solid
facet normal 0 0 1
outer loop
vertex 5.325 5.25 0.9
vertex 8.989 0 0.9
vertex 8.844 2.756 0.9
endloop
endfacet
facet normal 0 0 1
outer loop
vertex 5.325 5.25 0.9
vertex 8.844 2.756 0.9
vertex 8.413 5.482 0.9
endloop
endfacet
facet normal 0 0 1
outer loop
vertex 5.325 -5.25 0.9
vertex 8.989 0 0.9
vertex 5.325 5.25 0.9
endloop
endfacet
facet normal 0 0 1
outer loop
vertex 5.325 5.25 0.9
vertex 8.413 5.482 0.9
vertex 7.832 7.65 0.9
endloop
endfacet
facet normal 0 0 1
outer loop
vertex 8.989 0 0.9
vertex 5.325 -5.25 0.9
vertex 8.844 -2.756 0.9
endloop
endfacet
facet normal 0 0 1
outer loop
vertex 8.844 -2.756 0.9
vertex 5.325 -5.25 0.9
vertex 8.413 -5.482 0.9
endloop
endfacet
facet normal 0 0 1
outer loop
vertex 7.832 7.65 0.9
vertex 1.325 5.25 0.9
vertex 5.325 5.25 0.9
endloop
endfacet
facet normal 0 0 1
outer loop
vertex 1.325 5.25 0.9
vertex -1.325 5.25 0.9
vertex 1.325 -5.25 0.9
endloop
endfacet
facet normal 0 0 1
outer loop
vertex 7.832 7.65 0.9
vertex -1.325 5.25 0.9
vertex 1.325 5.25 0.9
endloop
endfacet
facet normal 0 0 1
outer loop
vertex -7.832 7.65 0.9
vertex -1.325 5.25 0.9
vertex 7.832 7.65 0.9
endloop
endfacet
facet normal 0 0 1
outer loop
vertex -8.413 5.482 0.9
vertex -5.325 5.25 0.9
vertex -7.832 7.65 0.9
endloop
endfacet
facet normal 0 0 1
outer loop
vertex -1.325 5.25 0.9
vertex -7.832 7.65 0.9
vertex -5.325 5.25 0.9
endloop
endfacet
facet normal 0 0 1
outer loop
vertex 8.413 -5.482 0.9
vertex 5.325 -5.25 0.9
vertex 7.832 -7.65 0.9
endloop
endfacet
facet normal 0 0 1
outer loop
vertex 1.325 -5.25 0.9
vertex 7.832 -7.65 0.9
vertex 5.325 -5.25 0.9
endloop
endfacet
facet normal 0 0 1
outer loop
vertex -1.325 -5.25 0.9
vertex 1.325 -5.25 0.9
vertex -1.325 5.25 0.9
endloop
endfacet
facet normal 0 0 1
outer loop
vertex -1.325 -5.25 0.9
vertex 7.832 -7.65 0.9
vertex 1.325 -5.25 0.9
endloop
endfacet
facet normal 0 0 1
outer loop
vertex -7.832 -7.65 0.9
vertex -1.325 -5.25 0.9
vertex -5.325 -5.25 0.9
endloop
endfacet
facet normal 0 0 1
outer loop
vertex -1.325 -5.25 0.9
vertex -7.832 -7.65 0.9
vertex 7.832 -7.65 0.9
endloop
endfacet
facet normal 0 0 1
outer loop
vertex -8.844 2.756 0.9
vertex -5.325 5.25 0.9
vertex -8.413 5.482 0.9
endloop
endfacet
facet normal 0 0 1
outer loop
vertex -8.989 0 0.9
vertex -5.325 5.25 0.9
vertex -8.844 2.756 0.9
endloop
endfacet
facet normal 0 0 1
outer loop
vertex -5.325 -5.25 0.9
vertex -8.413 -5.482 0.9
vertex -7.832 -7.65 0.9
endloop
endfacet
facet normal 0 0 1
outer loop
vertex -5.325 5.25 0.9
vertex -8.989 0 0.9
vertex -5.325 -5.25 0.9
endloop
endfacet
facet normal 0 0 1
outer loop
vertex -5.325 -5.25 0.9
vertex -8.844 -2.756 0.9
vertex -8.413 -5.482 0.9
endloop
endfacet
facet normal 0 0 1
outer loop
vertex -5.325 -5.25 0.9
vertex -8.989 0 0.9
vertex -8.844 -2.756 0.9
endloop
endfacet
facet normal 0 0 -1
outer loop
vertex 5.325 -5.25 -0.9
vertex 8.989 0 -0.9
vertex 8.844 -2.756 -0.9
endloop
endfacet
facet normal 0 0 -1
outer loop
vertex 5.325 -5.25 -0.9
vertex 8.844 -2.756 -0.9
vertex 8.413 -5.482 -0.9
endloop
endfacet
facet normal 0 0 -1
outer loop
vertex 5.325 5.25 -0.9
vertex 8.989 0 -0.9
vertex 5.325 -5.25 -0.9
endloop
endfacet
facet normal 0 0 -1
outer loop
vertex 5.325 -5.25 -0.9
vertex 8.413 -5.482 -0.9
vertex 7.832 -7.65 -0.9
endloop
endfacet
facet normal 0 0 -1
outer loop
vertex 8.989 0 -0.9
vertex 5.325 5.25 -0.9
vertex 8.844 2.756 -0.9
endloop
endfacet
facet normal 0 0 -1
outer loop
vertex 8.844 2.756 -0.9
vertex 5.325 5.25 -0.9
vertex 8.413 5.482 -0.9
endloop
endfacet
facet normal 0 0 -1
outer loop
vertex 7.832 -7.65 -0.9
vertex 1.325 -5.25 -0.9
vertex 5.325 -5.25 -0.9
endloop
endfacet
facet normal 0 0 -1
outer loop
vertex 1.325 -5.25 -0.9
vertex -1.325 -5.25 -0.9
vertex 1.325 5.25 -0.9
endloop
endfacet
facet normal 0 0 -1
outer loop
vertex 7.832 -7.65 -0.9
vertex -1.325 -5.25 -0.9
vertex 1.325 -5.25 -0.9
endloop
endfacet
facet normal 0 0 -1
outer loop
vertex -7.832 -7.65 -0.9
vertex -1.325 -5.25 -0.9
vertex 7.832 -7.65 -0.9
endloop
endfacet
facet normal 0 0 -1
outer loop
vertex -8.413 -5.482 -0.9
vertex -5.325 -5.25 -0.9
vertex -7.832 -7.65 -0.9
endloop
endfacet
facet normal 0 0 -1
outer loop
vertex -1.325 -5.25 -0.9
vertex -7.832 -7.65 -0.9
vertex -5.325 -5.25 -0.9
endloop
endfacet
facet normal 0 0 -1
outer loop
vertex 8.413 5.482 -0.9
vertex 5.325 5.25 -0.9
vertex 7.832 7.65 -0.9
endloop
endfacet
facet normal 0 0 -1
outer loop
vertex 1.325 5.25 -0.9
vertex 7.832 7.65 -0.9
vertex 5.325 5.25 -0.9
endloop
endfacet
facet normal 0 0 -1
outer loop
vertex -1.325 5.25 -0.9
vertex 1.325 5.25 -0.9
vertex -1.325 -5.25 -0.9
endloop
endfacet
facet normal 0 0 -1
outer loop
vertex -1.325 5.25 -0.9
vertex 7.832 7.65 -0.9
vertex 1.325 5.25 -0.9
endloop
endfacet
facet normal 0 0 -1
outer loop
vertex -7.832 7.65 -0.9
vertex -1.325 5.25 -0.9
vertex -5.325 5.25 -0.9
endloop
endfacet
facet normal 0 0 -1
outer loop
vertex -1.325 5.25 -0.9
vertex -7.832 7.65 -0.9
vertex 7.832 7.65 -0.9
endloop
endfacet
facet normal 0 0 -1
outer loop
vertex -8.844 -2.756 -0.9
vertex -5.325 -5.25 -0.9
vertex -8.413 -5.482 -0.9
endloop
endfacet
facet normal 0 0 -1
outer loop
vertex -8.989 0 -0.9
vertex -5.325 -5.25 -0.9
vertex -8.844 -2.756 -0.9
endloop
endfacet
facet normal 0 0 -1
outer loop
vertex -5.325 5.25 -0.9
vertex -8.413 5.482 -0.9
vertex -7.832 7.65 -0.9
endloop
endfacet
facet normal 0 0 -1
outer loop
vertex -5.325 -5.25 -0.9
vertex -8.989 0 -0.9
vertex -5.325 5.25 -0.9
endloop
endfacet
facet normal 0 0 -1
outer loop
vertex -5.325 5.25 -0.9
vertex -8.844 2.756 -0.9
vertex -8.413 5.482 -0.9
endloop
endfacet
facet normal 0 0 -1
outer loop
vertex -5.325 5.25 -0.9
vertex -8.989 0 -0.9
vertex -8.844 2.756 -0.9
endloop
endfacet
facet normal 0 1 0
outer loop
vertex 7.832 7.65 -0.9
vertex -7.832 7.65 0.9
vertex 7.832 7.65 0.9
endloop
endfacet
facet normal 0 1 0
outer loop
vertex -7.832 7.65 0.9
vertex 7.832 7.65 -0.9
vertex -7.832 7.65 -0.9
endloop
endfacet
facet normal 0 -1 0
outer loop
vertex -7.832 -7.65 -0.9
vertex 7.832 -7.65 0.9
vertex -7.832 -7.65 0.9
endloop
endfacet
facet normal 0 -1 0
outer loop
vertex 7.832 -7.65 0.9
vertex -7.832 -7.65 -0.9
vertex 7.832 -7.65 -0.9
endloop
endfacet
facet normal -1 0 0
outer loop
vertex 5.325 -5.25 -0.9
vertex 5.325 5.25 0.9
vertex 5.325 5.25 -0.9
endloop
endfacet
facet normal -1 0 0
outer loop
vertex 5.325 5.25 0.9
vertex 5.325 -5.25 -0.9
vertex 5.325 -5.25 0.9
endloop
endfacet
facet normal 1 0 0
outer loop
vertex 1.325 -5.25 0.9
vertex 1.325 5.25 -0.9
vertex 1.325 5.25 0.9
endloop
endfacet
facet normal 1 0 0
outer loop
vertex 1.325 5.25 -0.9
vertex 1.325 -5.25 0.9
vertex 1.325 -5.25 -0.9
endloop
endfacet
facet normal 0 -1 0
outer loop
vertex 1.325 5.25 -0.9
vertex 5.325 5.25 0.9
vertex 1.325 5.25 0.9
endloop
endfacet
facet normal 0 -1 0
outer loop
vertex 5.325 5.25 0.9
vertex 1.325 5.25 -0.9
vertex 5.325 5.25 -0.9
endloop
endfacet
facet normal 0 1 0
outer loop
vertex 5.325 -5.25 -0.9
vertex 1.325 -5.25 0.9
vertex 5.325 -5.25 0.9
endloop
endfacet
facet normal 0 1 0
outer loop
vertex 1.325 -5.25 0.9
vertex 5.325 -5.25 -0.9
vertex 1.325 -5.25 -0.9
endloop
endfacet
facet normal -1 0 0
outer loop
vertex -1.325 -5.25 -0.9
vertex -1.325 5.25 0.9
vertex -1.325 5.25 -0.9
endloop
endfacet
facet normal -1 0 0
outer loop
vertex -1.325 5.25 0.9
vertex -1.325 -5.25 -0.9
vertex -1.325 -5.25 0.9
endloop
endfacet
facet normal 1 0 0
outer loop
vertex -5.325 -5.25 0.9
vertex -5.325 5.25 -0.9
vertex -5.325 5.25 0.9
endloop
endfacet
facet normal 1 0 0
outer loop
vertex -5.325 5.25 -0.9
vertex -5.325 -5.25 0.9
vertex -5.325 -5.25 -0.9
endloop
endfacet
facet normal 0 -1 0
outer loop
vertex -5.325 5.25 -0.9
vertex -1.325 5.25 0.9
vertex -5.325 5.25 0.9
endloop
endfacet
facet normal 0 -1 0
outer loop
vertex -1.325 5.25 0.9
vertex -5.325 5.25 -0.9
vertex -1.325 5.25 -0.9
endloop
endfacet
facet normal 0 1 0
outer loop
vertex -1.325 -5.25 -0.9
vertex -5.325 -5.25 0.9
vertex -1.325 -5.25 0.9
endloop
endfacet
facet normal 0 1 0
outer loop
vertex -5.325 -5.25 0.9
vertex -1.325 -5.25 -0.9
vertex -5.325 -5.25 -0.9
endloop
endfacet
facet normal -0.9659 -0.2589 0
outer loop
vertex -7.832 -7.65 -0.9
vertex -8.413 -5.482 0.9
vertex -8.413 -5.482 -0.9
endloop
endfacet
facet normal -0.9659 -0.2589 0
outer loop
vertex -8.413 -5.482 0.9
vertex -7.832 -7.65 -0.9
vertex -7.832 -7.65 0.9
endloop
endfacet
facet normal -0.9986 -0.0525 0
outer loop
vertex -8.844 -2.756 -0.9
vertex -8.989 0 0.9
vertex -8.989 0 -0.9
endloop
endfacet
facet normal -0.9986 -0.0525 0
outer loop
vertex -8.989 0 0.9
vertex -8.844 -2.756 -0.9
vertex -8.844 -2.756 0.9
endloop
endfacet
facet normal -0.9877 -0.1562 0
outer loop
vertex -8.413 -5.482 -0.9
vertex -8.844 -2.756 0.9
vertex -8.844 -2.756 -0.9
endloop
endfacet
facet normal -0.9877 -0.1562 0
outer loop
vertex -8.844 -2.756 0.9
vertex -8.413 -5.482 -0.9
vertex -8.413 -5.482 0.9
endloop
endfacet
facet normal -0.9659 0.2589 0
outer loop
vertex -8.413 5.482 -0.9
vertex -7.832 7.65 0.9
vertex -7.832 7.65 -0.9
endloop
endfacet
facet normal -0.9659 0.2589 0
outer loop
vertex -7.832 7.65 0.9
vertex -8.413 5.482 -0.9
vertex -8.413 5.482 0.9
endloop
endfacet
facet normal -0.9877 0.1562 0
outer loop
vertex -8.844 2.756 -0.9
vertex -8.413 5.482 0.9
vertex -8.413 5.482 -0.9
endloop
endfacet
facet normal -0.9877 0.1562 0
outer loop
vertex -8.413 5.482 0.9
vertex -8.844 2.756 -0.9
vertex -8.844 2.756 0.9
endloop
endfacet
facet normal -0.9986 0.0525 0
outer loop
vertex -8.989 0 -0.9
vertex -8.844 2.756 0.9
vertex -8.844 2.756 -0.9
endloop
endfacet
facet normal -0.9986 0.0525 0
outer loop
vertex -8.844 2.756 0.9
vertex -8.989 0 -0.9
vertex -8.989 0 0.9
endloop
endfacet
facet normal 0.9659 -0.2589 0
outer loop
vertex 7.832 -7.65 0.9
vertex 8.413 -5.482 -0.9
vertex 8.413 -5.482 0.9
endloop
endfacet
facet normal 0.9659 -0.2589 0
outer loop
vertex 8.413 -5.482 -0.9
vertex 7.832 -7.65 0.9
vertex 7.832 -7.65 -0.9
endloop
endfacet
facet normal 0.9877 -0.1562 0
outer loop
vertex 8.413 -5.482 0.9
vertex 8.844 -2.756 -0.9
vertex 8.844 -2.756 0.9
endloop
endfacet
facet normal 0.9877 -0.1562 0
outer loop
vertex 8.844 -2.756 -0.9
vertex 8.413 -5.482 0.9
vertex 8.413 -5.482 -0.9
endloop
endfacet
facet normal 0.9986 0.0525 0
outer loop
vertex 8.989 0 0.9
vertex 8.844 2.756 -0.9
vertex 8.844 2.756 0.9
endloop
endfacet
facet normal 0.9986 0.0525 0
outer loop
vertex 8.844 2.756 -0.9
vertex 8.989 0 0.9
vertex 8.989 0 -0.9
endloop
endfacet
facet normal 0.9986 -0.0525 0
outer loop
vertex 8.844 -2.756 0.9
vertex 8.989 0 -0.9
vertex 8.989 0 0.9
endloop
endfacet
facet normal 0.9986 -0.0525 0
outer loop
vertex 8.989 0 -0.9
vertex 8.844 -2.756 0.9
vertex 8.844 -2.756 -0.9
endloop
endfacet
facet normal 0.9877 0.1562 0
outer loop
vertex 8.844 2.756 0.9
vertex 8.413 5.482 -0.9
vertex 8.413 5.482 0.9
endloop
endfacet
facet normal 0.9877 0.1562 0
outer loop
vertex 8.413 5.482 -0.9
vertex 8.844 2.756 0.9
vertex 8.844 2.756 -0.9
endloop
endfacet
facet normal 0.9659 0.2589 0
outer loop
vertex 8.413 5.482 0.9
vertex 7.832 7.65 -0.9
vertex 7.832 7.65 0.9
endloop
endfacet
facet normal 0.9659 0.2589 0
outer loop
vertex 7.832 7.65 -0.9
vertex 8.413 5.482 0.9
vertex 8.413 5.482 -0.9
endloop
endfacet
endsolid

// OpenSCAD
// strap buckle customizable
// speedo goggles w=10.3 d=1.9 h=1.8

strap_width=10.3; // mm
strap_depth=1.9; // mm

total_width=strap_depth*2+strap_depth*2+strap_depth*1.5+strap_depth*2+strap_depth*2;
total_depth=strap_width+5;
total_height=1.8; // mm
t=0.2*1; // tolerance for holes

intersection()
{
    difference()
    {
        // main buckle block
        cube([total_width,total_depth,total_height], center=true);
        // holes for strap
        translate([strap_depth*1.75,0,0])
            cube([strap_depth*2+t,strap_width+t,total_height+t],center=true);
        translate([-strap_depth*1.75,0,0])
            cube([strap_depth*2+t,strap_width+t,total_height+t],center=true);
    }
    
    // intersection to shape rounded borders with two spheres
    translate([pow(total_depth,1.2)-total_width/2,0,0])
        sphere(pow(total_depth,1.2),$fn=60);
    translate([-pow(total_depth,1.2)+total_width/2,0,0])
        sphere(pow(total_depth,1.2),$fn=60);
}
